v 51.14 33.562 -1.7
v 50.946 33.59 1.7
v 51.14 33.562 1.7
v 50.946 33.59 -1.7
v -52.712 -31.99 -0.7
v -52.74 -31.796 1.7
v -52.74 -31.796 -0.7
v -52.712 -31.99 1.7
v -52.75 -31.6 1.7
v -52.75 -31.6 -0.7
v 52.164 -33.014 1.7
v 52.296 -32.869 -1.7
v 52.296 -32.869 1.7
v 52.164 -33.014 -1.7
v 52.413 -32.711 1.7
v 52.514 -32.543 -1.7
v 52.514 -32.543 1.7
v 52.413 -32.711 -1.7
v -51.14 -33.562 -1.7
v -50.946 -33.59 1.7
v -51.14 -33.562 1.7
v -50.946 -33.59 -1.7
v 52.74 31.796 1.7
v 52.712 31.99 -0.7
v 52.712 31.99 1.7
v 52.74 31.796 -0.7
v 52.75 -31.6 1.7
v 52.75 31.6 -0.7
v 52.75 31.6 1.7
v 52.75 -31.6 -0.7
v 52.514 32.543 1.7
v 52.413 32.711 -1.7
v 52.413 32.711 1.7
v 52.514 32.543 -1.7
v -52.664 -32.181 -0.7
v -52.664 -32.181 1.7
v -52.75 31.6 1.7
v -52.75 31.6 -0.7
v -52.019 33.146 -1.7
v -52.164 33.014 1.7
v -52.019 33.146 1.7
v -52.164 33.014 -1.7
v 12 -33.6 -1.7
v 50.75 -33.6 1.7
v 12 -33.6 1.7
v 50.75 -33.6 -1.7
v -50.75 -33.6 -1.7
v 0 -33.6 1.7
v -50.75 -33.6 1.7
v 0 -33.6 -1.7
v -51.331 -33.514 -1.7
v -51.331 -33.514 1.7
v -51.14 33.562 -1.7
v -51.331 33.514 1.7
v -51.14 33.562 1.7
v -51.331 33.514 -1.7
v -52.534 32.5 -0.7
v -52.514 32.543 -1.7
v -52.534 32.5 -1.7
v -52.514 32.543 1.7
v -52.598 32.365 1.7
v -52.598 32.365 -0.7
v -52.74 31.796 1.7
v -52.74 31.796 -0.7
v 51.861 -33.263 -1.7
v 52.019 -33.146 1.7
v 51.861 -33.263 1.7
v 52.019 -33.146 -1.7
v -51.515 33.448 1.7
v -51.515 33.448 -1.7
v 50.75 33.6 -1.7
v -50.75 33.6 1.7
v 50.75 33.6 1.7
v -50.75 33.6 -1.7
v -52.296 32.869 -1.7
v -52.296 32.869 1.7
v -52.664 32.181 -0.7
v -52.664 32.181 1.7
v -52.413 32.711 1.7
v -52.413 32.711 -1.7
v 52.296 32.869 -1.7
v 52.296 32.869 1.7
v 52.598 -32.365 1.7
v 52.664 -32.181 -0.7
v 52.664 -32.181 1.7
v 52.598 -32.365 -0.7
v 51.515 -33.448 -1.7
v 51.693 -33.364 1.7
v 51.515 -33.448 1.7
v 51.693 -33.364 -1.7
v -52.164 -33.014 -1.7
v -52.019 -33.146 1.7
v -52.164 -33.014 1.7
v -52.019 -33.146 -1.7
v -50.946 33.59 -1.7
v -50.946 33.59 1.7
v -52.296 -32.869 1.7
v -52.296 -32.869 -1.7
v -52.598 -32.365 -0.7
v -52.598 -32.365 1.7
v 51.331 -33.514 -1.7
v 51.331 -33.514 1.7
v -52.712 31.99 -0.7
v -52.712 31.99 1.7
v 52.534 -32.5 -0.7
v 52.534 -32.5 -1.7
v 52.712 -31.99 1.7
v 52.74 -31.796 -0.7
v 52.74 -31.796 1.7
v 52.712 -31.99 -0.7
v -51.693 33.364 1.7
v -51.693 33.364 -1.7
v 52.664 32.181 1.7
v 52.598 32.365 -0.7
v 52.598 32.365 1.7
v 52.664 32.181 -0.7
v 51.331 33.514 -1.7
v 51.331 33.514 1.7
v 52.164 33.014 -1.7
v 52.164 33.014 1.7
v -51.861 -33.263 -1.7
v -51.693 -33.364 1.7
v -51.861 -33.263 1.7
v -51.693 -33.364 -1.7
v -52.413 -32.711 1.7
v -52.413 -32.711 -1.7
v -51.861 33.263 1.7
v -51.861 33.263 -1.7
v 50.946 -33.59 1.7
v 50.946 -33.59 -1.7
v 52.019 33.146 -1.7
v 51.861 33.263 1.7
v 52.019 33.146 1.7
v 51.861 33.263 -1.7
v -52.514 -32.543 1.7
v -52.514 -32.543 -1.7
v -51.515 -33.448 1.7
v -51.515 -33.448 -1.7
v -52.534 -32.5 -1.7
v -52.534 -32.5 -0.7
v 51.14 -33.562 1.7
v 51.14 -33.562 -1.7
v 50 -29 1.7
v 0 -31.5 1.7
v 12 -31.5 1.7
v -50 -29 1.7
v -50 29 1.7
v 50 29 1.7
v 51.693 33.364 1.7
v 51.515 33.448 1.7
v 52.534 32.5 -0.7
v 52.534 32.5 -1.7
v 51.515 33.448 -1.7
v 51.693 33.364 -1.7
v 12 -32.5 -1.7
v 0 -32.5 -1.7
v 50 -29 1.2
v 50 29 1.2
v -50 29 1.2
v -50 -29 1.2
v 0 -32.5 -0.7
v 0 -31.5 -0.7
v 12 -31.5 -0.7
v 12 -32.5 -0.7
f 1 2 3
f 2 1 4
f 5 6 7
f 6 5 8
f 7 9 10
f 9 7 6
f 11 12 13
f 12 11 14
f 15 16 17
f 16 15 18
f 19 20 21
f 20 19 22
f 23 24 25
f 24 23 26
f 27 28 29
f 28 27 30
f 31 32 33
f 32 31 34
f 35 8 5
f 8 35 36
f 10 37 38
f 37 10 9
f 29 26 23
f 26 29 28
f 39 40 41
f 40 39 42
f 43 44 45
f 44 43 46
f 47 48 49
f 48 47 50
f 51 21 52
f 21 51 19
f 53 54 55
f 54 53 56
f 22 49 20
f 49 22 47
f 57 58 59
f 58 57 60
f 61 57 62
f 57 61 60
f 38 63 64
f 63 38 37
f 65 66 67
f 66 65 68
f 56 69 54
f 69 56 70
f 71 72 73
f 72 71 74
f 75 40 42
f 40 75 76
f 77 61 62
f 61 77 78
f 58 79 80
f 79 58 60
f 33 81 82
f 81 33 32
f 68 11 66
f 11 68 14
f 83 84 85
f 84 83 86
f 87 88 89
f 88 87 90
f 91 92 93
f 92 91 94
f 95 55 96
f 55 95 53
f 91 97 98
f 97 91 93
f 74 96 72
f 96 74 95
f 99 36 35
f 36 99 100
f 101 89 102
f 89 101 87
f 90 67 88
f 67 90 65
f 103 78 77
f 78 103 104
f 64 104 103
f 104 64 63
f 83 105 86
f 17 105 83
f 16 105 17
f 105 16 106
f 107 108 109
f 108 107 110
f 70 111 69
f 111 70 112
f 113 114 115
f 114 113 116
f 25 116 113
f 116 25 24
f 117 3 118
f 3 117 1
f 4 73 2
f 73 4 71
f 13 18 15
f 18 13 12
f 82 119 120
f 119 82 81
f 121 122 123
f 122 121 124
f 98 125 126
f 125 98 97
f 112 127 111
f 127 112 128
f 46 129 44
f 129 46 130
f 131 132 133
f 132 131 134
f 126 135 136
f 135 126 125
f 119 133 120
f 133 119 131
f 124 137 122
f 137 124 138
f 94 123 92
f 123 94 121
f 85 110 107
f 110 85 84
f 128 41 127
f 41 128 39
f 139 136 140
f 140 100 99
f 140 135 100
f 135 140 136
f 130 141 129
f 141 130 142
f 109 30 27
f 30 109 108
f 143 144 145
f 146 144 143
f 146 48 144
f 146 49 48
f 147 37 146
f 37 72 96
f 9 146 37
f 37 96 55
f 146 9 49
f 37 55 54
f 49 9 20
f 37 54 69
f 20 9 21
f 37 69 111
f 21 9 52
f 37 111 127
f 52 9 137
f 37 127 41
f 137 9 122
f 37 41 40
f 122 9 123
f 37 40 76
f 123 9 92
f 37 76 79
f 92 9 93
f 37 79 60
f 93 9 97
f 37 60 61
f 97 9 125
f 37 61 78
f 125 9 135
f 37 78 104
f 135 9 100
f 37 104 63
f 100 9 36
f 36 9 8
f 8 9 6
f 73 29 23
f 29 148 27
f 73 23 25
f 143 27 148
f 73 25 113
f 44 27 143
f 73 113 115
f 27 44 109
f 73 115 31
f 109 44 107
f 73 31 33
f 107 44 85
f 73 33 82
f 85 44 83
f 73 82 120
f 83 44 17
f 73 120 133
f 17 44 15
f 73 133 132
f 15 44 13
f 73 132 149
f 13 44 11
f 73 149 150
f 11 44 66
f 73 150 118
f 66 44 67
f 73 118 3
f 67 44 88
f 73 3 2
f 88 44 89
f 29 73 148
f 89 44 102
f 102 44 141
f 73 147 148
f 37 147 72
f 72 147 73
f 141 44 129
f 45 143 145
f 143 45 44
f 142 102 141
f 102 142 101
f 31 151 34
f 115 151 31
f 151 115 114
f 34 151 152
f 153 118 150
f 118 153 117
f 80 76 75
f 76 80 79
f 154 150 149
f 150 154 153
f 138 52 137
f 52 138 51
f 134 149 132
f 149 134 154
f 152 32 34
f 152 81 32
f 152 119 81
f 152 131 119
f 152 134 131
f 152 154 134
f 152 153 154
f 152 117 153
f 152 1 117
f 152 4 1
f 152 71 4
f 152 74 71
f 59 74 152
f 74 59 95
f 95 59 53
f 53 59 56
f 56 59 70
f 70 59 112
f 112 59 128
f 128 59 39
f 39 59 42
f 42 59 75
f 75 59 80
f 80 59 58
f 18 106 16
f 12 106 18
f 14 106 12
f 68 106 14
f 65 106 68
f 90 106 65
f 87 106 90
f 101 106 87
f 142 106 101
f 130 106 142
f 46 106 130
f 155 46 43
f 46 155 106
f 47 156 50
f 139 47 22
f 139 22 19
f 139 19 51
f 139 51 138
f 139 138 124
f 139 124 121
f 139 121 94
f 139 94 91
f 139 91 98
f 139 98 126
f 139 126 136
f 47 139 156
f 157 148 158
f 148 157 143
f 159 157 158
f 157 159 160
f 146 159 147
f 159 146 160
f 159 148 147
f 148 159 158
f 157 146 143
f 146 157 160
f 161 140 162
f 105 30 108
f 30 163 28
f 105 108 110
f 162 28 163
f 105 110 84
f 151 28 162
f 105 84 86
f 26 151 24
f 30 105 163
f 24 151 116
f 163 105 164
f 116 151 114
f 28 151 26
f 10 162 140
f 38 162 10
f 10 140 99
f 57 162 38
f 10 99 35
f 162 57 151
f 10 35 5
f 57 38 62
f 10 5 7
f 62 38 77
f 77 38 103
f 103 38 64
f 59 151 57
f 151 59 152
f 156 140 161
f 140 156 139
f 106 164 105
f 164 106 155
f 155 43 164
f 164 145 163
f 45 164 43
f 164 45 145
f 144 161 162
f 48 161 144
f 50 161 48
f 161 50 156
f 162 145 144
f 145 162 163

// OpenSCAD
$fn=64;

module rounded_rect_2d(w,h,r){
    r2 = min(r, min(w,h)/2);
    hull(){
        translate([ w/2-r2,  h/2-r2]) circle(r=r2);
        translate([-w/2+r2,  h/2-r2]) circle(r=r2);
        translate([ w/2-r2, -h/2+r2]) circle(r=r2);
        translate([-w/2+r2, -h/2+r2]) circle(r=r2);
    }
}

module lcd_display_4p3(){
    w = 105.5;
    h = 67.2;
    t = 3.4;

    // Screen window extents (from input)
    win_x1 = -50;
    win_y1 = -26.5;
    win_x2 = 50;
    win_y2 = 31.5;
    win_depth = 0.5;

    // Back recess extents (from input)
    back_x1 = -w/2;
    back_y1 = -65/2 + 1;
    back_x2 =  w/2;
    back_y2 =  65/2 + 1;
    back_depth = 1;

    // Small feature extents (from input)
    feat_x1 = 0;
    feat_y1 = -34.5;
    feat_x2 = 12;
    feat_y2 = -31.5;

    base_r = 2;

    difference(){
        // Main body centered at origin
        linear_extrude(height=t, center=true)
            rounded_rect_2d(w,h,base_r);

        // Front screen window recess (cut from front face)
        translate([0,0, t/2 - win_depth/2])
            cube([win_x2-win_x1, win_y2-win_y1, win_depth], center=true);

        // Back recess (cut from back face)
        translate([0,0, -t/2 + back_depth/2])
            cube([back_x2-back_x1, back_y2-back_y1, back_depth], center=true);

        // Small feature cut (through)
        translate([(feat_x1+feat_x2)/2, (feat_y1+feat_y2)/2, 0])
            cube([feat_x2-feat_x1, feat_y2-feat_y1, t+0.2], center=true);
    }
}

lcd_display_4p3();
